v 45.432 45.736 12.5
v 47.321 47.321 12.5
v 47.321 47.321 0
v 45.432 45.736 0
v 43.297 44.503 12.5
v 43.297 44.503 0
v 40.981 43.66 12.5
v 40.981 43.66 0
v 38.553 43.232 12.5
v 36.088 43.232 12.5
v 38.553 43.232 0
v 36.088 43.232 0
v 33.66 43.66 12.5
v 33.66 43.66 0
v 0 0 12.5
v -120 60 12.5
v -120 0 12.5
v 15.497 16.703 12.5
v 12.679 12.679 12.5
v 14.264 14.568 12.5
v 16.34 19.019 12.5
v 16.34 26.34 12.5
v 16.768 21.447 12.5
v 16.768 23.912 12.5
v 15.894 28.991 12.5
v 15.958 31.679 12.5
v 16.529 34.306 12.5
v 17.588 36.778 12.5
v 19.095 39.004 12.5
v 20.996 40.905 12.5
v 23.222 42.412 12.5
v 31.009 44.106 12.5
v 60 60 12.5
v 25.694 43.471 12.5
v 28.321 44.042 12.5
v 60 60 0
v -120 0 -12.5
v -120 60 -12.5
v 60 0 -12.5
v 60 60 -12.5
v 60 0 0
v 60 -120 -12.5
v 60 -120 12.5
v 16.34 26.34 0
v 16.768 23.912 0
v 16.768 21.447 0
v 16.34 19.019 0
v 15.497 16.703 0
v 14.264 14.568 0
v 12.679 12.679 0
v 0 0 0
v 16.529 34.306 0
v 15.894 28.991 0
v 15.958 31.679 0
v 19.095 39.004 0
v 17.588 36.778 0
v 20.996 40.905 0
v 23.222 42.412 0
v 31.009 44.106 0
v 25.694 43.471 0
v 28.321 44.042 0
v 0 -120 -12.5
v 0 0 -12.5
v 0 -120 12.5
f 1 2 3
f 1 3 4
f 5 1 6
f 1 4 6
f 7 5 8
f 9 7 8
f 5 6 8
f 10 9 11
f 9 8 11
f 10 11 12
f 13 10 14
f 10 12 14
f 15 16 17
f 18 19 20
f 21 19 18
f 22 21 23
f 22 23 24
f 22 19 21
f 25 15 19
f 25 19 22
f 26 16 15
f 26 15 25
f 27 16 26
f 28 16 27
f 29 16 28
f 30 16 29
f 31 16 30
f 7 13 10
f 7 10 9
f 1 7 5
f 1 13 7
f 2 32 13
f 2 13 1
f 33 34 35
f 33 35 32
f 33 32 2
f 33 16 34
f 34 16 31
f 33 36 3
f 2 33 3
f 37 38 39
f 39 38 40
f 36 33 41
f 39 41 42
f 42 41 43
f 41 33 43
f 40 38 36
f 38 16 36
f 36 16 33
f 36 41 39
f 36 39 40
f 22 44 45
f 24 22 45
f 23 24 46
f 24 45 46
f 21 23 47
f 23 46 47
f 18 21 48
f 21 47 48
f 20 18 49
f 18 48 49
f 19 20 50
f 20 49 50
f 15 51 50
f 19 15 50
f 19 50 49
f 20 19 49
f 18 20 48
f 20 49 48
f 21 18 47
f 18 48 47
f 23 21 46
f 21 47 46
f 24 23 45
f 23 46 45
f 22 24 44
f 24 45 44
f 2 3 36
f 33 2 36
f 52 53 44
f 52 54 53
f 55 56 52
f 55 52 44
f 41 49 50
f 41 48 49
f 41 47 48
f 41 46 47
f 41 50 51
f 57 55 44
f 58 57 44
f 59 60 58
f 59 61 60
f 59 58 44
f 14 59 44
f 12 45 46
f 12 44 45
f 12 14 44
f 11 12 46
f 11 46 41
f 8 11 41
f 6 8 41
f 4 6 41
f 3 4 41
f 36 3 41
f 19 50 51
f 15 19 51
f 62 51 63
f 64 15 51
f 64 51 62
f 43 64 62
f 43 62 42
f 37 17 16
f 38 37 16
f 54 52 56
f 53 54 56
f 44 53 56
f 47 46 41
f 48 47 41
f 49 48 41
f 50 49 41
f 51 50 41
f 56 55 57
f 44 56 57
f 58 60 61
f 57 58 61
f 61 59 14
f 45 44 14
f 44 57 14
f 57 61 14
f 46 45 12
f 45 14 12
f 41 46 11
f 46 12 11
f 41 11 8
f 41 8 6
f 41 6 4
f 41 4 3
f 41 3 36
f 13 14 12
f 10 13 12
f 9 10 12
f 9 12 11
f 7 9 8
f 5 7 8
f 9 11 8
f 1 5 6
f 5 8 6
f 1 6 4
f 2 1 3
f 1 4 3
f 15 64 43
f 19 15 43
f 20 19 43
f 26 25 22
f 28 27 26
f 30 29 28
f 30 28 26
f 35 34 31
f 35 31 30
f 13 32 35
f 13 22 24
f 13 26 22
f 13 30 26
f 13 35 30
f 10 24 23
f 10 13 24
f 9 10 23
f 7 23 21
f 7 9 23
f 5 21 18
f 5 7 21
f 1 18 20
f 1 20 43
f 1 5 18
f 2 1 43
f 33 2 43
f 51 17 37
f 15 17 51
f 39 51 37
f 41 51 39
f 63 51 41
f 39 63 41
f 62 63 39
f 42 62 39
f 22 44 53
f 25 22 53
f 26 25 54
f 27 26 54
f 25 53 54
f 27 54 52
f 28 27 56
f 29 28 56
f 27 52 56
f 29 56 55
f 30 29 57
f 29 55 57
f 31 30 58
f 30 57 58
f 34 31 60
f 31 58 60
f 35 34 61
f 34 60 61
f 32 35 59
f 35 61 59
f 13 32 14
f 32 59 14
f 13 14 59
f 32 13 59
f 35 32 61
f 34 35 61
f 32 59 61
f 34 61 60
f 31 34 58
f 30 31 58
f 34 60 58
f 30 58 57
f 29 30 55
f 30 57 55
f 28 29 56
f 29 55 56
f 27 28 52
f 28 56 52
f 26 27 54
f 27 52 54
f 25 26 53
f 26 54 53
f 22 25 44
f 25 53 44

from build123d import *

# Parameters (mm, degrees)
F2_DEPTH = 12.5
F3_W     = 180
F3_H     = 60
F4_DEPTH = 12.5
F6_DEPTH = 12.5
F7_W     = 60
F7_H     = 120
F8_DEPTH = 12.5


with BuildPart() as f2:
    # F1 (on Top) → F2 (new body)
    with BuildSketch(Plane.XY):
        with BuildLine():
            Line((-120, 0), (0, 0))
            Line((0, 0), (12.6794919243, 12.6794919243))
            ThreePointArc((12.6794919243, 12.6794919243), (16.3397459622, 19.0192378865), (16.3397459622, 26.3397459622))
            ThreePointArc((16.3397459622, 26.3397459622), (20, 40), (33.6602540378, 43.6602540378))
            ThreePointArc((33.6602540378, 43.6602540378), (40.9807621135, 43.6602540378), (47.3205080757, 47.3205080757))
            Line((47.3205080757, 47.3205080757), (60, 60))
            Line((60, 60), (-120, 60))
            Line((-120, 60), (-120, 0))
        make_face()
    extrude(amount=F2_DEPTH)

    # F3 (on Top) → F4 (join)
    with BuildSketch(Plane.XY):
        with Locations((-30, 30)):
            Rectangle(F3_W, F3_H)
    extrude(amount=-F4_DEPTH)


with BuildPart() as f6:
    # F5 (on Top) → F6 (new body)
    with BuildSketch(Plane.XY):
        with BuildLine():
            Line((60, -120), (60, 60))
            Line((60, 60), (47.3205080757, 47.3205080757))
            ThreePointArc((47.3205080757, 47.3205080757), (40.9807621135, 43.6602540378), (33.6602540378, 43.6602540378))
            ThreePointArc((33.6602540378, 43.6602540378), (20, 40), (16.3397459622, 26.3397459622))
            ThreePointArc((16.3397459622, 26.3397459622), (16.3397459622, 19.0192378865), (12.6794919243, 12.6794919243))
            Line((12.6794919243, 12.6794919243), (0, 0))
            Line((0, 0), (0, -120))
            Line((0, -120), (60, -120))
        make_face()
    extrude(amount=F6_DEPTH)

    # F7 (on face) → F8 (join)
    with BuildSketch(Plane(origin=(0, 0, 0), x_dir=(1, 0, 0), z_dir=(0, 0, -1))):
        with Locations((30, 60)):
            Rectangle(F7_W, F7_H)
    extrude(amount=F8_DEPTH)


solid = Compound([f2.part, f6.part])
